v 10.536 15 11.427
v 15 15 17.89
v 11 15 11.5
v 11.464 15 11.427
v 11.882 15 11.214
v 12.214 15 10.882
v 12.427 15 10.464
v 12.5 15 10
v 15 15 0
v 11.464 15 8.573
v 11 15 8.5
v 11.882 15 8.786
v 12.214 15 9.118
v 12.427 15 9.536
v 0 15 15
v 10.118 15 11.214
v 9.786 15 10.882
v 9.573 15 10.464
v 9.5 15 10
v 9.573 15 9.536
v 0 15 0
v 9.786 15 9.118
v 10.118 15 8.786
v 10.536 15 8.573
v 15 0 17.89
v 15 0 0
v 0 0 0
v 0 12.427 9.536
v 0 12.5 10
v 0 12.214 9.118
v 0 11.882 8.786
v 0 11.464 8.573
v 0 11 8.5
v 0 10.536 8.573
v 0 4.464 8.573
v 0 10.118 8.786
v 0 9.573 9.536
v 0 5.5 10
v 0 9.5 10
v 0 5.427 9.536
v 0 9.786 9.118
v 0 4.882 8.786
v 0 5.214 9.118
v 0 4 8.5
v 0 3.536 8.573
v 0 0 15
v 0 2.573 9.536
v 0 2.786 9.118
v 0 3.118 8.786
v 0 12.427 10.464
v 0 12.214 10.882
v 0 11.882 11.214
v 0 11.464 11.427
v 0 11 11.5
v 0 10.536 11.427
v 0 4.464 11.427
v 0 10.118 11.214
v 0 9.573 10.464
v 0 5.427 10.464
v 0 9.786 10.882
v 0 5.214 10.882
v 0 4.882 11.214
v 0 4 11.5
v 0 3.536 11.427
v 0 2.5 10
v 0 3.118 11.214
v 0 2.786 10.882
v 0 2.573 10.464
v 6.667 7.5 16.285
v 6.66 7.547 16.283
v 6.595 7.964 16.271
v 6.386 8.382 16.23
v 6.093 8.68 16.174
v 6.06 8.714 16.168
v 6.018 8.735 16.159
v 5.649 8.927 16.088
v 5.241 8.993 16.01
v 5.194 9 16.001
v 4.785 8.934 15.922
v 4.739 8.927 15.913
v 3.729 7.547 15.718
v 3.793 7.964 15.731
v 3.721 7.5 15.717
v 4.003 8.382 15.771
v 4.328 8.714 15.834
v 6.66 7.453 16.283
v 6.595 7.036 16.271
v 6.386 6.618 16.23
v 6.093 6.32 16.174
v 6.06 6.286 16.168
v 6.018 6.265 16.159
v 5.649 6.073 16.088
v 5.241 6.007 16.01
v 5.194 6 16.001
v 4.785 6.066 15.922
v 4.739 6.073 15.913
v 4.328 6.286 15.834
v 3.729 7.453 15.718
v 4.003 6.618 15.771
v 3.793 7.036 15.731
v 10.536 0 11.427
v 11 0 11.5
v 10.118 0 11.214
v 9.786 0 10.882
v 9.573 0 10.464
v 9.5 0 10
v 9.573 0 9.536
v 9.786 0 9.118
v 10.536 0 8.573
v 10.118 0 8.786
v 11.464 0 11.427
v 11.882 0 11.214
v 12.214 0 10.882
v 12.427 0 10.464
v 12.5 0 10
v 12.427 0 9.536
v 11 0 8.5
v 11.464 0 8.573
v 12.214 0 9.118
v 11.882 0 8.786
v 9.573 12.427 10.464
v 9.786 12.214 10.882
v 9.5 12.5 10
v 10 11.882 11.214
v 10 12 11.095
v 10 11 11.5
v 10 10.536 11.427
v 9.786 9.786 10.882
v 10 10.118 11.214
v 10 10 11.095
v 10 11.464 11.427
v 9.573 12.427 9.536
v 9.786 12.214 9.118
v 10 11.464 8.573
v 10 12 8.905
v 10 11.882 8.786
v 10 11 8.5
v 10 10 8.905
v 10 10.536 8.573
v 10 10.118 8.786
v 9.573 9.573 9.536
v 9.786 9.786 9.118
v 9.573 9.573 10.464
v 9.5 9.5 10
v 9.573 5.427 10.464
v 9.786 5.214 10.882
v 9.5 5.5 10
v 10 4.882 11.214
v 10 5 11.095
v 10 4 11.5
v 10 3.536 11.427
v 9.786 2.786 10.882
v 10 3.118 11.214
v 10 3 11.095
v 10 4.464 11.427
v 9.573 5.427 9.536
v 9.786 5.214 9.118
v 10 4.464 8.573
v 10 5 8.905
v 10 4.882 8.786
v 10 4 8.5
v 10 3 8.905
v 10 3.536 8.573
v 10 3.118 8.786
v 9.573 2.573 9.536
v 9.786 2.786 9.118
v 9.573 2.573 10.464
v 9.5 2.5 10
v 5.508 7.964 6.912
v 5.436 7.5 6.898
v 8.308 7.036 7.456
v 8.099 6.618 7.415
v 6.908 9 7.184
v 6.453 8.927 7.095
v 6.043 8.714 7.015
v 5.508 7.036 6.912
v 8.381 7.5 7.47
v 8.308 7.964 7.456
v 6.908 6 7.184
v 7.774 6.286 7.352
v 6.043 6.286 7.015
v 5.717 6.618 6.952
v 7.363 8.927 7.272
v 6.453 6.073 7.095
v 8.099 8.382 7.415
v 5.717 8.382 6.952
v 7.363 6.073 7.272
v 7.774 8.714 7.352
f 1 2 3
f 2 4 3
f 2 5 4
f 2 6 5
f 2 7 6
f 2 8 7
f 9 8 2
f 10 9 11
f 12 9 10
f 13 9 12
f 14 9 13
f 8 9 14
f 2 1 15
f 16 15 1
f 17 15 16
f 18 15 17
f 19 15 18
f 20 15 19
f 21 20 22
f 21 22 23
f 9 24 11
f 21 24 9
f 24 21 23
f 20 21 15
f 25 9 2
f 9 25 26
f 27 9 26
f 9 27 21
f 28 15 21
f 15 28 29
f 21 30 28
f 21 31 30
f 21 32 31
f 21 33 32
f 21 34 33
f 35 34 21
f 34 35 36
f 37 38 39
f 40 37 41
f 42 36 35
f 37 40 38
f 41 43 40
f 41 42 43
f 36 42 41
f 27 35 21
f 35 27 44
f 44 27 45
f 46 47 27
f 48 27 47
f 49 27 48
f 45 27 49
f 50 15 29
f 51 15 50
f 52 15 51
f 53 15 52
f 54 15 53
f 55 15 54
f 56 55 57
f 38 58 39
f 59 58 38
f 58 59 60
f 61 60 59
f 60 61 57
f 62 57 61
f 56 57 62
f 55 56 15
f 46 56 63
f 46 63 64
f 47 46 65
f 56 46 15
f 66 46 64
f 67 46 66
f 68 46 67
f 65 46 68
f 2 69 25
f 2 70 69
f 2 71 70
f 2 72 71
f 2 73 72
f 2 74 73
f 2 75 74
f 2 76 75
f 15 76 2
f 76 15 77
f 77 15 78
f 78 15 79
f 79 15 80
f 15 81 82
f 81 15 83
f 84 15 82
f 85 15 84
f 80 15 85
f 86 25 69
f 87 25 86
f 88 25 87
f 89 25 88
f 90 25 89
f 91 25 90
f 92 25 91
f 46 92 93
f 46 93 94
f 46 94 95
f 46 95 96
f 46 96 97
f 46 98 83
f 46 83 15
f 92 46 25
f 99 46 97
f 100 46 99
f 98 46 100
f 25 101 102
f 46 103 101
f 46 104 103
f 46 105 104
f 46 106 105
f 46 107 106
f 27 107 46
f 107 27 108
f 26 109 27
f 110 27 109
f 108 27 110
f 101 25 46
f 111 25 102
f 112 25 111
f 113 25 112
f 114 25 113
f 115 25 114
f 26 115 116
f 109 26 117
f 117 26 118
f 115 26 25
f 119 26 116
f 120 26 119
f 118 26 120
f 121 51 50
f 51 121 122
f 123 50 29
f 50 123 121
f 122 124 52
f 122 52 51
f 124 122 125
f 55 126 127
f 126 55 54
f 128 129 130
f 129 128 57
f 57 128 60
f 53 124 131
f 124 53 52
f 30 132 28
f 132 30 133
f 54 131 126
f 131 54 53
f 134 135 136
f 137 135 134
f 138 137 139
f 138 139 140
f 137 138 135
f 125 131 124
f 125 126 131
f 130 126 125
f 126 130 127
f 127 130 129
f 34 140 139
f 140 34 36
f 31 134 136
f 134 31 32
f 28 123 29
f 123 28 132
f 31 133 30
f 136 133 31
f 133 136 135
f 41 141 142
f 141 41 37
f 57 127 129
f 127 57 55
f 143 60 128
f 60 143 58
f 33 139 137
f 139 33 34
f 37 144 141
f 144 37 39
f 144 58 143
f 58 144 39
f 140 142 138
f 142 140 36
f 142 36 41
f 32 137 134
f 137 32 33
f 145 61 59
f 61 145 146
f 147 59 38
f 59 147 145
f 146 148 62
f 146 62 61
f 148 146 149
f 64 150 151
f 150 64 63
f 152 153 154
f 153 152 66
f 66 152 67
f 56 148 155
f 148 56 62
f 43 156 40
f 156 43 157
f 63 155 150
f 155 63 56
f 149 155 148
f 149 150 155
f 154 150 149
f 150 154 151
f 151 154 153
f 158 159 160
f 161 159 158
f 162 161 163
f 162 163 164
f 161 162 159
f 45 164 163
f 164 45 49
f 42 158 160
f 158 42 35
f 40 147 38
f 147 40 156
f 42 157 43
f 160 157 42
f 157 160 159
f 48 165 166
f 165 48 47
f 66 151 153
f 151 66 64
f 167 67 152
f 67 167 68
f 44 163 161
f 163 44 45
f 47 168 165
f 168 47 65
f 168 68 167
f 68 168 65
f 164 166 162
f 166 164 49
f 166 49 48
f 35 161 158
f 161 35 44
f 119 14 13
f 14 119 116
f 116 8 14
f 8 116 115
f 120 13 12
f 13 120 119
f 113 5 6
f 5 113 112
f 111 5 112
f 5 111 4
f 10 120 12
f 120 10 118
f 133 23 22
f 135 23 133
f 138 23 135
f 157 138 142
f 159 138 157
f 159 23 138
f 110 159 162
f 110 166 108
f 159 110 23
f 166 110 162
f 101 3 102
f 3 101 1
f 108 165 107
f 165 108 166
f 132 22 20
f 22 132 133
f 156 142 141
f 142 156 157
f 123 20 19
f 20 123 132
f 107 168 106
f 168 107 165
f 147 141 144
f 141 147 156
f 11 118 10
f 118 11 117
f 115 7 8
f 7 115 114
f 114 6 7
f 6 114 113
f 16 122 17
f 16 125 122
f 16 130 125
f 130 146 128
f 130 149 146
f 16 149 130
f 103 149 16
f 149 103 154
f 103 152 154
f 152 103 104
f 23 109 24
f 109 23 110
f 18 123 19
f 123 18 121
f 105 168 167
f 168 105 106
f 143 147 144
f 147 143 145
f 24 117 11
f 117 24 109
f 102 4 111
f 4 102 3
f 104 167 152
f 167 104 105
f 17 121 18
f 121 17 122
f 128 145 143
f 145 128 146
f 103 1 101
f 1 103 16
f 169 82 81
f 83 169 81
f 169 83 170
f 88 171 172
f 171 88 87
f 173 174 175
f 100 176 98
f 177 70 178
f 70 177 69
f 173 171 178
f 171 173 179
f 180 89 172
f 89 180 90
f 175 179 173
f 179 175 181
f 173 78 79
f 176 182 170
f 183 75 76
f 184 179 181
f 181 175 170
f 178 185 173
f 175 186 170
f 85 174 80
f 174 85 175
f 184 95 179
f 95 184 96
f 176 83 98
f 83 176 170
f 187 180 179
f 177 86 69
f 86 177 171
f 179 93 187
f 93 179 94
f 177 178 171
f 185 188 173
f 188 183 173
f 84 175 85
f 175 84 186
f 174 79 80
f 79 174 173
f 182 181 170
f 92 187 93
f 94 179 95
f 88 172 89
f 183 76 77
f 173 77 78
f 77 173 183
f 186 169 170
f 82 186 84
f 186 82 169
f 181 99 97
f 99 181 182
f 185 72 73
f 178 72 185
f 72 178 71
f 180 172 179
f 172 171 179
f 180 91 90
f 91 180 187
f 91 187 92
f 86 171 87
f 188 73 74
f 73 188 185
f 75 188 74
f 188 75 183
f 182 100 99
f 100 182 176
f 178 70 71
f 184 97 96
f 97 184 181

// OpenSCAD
//connecting block for front top of case
//angle is at 79.1 degrees

$fn = 20;

module block(){
    polygon([    [0,0],
                [0,15],
                [15,17.89],
                [15,0]
            ]);
}

difference(){
    
    translate([0,15,0]) rotate([90,0,0]) linear_extrude(15) block();
    
    translate([0,11,10]) rotate([90,0,90]) cylinder(10,1.5,1.5);
    translate([0,4,10]) rotate([90,0,90]) cylinder(10,1.5,1.5);
    translate([11,0,10]) rotate([270,0,0]) cylinder(15,1.5,1.5);
    translate([5,7.5,17]) rotate([0,169,0]) cylinder(10,1.5,1.5);
}
